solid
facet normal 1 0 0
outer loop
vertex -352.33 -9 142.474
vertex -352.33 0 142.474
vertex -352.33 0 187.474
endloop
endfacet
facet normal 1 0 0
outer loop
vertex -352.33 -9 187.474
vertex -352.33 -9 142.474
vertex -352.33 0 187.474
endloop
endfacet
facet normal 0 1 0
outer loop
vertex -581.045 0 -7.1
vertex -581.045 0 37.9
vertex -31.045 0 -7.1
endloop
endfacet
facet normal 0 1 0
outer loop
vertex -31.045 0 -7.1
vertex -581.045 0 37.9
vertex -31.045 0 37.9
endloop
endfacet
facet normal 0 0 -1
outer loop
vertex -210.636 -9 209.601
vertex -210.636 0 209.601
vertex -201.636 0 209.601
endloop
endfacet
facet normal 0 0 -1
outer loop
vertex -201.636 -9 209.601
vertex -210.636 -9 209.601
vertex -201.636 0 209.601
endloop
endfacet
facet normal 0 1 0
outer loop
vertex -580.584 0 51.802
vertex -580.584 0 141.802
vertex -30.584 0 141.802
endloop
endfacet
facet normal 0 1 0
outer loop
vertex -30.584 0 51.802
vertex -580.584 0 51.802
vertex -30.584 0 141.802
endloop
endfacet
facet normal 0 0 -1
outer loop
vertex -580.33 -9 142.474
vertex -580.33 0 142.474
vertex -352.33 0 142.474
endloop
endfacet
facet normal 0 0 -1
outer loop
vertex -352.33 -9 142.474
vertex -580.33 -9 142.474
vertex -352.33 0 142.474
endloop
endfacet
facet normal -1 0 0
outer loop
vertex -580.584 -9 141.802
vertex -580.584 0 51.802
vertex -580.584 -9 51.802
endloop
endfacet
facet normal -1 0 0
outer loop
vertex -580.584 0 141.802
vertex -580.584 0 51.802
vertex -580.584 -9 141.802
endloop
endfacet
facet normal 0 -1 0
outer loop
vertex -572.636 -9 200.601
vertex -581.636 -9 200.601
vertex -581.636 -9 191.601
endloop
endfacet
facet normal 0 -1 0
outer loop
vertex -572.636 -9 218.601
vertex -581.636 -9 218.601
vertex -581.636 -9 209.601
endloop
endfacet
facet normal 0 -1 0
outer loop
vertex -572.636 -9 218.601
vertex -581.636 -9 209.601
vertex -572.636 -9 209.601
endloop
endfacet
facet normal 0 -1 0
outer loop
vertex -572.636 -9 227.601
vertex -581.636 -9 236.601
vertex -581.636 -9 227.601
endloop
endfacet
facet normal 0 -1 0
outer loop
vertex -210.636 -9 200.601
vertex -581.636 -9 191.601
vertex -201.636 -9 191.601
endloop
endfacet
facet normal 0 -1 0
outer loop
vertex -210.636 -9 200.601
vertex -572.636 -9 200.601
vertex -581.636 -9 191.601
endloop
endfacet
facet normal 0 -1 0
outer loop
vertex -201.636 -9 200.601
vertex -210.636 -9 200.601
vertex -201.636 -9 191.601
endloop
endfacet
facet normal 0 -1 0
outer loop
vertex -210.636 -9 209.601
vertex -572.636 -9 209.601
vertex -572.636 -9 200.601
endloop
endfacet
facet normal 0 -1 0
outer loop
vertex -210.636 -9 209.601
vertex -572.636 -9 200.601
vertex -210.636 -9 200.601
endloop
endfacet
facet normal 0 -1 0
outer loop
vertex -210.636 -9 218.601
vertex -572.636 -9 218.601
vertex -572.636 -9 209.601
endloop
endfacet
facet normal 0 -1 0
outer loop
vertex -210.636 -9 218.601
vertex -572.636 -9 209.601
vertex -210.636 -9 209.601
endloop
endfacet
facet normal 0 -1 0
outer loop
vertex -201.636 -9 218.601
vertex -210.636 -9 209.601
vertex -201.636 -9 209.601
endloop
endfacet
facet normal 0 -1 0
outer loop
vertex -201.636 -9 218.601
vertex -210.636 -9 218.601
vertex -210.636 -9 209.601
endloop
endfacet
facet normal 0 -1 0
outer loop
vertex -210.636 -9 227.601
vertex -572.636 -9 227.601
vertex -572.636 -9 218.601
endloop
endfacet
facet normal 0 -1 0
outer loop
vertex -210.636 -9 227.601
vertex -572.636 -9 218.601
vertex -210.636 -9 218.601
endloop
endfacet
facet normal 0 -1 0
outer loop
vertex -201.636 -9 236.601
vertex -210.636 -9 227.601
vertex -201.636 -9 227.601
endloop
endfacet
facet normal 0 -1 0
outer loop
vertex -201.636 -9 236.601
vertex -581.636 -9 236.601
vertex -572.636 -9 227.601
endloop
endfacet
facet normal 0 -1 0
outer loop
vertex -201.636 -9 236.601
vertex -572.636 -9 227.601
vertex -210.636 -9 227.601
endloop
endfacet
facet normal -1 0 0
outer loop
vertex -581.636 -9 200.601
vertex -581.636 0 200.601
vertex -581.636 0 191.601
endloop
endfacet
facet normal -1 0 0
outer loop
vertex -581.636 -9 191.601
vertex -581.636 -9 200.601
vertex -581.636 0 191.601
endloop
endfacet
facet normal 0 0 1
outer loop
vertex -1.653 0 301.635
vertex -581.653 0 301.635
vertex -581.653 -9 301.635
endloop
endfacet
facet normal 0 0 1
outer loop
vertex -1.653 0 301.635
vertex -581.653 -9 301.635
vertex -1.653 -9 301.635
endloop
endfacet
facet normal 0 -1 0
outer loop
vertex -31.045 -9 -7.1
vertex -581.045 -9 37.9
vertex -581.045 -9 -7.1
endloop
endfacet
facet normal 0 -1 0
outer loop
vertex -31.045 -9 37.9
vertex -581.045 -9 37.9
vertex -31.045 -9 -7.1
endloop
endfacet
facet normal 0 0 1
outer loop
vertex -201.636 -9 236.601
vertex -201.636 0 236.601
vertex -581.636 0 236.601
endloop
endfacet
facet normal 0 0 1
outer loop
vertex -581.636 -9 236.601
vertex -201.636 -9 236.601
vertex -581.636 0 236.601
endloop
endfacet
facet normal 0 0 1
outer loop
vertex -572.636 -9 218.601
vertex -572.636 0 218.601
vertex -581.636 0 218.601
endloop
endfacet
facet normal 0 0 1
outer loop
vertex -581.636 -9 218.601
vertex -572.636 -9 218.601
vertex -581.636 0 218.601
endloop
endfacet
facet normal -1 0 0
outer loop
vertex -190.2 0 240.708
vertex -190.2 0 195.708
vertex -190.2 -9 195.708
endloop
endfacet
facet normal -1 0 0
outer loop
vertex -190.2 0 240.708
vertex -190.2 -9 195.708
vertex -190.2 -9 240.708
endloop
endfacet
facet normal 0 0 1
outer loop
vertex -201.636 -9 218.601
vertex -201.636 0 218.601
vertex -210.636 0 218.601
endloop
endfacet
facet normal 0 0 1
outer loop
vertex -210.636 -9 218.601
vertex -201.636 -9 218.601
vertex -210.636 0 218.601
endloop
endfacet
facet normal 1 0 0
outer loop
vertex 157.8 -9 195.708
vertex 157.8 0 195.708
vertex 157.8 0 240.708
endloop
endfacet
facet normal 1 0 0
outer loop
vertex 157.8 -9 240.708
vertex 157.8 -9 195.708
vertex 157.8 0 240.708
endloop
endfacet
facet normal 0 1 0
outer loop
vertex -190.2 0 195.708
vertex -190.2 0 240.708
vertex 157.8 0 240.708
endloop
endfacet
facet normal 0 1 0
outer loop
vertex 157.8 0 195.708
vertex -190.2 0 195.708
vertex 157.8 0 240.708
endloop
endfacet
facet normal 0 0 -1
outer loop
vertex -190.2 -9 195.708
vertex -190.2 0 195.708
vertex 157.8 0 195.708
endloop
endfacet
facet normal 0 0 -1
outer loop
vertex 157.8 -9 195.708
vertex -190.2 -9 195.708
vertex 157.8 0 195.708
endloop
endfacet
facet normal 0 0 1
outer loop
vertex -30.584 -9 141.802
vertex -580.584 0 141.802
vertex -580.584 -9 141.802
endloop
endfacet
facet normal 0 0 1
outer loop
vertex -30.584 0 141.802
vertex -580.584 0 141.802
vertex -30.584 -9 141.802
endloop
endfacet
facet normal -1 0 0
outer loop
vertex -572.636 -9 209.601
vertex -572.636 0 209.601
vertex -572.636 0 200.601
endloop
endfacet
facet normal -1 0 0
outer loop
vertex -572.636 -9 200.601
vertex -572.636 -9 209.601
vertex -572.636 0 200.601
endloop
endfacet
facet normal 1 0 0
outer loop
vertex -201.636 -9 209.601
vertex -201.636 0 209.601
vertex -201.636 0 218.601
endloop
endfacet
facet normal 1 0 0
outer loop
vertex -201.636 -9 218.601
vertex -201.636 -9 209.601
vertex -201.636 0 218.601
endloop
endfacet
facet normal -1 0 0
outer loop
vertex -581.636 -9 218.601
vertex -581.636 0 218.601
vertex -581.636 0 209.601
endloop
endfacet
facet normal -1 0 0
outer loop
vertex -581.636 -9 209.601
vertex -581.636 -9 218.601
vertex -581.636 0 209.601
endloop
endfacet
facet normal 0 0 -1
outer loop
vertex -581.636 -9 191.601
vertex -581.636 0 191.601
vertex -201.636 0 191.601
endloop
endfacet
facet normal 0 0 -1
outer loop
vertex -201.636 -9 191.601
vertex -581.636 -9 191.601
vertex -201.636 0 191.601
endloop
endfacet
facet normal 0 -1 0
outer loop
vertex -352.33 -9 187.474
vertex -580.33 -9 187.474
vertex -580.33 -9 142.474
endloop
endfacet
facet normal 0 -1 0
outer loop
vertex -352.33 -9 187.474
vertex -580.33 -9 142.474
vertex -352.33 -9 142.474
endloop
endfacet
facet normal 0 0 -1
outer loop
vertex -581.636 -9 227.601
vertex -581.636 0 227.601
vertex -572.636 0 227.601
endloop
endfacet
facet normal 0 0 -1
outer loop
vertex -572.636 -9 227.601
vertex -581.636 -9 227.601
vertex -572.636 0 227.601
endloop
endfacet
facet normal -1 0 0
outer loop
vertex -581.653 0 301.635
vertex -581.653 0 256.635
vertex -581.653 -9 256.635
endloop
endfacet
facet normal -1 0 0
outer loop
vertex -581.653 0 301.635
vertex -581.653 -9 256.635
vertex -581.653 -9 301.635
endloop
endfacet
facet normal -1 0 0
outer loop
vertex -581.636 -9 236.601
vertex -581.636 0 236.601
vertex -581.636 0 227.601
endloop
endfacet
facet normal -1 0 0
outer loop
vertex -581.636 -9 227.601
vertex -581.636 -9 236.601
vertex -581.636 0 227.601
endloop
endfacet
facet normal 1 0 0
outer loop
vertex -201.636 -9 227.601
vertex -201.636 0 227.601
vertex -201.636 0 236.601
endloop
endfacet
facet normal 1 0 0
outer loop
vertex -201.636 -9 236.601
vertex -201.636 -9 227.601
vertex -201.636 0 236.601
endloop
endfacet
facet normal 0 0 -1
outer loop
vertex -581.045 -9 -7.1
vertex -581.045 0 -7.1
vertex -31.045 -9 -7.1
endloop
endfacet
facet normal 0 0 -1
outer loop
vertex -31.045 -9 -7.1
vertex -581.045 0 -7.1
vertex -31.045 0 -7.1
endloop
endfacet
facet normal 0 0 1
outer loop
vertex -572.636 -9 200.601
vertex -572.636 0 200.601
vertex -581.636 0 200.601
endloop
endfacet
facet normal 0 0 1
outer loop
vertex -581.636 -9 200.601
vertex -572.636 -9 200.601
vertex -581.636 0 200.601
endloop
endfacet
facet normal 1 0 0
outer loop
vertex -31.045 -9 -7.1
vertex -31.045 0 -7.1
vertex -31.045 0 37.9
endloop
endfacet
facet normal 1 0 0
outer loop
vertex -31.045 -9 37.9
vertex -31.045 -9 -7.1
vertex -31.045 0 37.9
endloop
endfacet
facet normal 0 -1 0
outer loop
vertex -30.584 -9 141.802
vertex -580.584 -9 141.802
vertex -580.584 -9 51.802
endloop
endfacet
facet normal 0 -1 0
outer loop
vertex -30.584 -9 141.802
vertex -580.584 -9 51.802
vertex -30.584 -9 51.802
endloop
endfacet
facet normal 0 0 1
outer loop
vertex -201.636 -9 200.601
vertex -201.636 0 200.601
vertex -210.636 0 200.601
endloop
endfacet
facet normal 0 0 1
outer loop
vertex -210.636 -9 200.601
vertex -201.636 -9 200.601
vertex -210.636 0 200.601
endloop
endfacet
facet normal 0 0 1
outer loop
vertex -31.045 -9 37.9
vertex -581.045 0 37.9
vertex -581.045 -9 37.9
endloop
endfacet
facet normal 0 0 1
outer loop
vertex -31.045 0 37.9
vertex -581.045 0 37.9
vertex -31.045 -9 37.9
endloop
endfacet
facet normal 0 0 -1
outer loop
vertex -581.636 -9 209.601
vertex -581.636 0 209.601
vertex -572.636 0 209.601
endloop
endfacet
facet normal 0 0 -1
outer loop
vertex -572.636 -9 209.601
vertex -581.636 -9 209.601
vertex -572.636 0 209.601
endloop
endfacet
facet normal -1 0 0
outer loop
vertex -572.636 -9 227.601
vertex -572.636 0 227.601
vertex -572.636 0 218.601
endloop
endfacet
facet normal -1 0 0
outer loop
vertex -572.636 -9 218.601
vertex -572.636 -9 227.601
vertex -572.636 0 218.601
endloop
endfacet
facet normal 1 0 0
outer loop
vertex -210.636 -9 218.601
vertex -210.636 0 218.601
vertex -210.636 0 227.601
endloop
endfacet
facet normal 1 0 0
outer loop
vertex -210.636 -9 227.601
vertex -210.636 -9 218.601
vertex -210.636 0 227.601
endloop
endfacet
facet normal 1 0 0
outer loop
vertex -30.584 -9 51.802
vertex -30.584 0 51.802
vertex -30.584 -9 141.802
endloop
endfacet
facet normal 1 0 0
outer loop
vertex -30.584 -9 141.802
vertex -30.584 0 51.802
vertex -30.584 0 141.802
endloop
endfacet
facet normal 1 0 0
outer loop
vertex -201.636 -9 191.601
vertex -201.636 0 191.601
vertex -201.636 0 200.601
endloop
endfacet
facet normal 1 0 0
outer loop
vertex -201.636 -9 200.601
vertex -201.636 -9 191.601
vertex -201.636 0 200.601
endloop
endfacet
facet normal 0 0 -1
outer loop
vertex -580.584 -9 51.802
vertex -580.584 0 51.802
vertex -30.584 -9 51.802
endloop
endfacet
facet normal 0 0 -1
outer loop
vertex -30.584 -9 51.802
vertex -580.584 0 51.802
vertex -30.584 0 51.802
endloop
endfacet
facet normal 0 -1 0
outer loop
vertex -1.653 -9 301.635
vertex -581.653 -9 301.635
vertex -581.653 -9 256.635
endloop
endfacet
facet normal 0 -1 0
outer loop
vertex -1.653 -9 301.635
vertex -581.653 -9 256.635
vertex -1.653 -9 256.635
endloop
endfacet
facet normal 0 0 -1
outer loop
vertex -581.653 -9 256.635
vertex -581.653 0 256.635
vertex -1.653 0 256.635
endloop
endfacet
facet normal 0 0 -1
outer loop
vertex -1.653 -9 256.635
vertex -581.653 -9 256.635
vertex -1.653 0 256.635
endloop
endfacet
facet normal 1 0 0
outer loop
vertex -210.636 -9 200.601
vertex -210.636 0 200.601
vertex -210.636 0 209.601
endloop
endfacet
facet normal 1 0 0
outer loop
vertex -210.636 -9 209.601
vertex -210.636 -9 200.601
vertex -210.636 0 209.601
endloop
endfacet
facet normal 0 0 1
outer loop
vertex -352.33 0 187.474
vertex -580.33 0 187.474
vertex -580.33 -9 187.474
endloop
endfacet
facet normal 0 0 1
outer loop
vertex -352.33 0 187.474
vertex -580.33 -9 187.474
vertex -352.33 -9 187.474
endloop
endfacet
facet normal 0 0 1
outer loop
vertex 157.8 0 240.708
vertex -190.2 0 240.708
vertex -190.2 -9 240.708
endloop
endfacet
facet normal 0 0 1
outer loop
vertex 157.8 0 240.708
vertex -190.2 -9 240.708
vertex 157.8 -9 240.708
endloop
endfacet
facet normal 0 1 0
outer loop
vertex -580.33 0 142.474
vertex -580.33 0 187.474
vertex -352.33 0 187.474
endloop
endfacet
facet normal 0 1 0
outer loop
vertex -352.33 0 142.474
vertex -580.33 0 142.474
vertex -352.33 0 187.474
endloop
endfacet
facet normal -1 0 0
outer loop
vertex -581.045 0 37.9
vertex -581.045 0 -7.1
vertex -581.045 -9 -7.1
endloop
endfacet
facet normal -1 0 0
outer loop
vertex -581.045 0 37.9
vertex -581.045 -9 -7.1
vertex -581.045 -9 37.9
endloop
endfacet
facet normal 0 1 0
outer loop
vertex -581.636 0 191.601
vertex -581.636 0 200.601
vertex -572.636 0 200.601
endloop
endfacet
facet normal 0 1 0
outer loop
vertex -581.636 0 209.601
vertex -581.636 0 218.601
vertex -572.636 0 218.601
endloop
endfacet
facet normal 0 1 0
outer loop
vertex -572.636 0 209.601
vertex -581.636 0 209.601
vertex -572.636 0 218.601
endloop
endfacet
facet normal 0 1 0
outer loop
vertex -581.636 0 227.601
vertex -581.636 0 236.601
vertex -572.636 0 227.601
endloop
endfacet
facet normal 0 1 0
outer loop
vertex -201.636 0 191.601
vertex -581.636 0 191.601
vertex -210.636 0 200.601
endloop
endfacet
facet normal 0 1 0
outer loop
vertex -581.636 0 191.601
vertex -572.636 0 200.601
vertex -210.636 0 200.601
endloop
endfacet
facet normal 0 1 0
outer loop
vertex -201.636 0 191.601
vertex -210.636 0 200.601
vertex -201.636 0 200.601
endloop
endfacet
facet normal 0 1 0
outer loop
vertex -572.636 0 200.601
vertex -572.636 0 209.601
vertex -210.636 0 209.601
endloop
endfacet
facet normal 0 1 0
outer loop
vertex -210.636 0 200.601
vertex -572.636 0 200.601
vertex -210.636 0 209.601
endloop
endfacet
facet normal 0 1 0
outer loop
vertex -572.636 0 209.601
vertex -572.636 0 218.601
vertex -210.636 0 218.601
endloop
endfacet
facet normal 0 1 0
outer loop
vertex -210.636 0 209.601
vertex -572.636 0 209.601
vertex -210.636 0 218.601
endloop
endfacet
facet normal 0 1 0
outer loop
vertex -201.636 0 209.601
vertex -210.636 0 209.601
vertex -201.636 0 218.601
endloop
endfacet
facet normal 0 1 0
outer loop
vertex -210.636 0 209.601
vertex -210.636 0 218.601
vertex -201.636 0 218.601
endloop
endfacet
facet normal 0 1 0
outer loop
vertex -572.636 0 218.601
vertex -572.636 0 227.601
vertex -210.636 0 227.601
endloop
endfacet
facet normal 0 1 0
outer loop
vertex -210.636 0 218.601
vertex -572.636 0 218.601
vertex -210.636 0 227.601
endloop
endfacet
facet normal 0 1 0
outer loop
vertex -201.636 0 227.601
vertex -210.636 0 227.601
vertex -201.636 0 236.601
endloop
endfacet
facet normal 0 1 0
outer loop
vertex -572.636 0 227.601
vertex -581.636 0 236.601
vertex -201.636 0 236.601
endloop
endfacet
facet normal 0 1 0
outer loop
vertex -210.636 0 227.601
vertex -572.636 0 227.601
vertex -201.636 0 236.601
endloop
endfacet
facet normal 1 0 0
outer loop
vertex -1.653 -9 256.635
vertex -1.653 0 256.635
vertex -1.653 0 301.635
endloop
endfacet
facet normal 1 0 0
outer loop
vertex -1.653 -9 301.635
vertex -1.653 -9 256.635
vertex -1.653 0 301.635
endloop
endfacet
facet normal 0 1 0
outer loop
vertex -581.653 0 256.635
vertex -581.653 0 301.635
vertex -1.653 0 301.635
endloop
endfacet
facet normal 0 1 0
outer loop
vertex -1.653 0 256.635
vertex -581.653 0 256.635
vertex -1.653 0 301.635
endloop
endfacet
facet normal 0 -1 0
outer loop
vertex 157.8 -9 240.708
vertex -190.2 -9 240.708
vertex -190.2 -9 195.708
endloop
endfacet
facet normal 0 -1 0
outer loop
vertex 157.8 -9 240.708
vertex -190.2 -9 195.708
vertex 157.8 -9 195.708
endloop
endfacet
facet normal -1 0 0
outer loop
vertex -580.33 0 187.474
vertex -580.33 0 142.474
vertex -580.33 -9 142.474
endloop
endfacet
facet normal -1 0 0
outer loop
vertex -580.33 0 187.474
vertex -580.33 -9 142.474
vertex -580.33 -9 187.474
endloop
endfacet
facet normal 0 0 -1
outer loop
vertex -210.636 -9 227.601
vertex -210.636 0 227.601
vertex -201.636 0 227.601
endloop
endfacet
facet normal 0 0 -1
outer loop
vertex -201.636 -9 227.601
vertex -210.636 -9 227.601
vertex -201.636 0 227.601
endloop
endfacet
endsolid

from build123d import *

# Parameters (mm, degrees)
F0_W      = 580
F0_H      = 45
F1_DEPTH  = 9
F2_W      = 9
F2_H      = 9
F3_DEPTH  = 9
F4_W      = 348
F4_H      = 45
F5_DEPTH  = 9
F6_W      = 228
F6_H      = 45
F7_DEPTH  = 9
F8_W      = 550
F8_H      = 90
F9_DEPTH  = 9
F10_W     = 550
F10_H     = 45
F11_DEPTH = 9


with BuildPart() as f1:
    # F0 (on Front) → F1 (new body)
    with BuildSketch(Plane.XZ):
        with Locations((-291.652689, 279.135075)):
            Rectangle(F0_W, F0_H)
    extrude(amount=F1_DEPTH)


with BuildPart() as f3:
    # F2 (on Front) → F3 (new body)
    with BuildSketch(Plane.XZ):
        Polygon((-572.635822, 236.600574), (-581.635822, 236.600574), (-581.635822, 227.600574), (-572.635822, 227.600574), (-572.635822, 218.600574), (-581.635822, 218.600574), (-581.635822, 209.600574), (-572.635822, 209.600574), (-572.635822, 200.600574), (-581.635822, 200.600574), (-581.635822, 191.600574), (-572.635822, 191.600574), (-210.635822, 191.600574), (-201.635822, 191.600574), (-201.635822, 196.600574), (-201.635822, 200.600574), (-210.635822, 200.600574), (-210.635822, 209.600574), (-201.635822, 209.600574), (-201.635822, 218.600574), (-210.635822, 218.600574), (-210.635822, 227.600574), (-210.635822, 236.600574), align=None)
        with Locations((-206.135822, 232.100574)):
            Rectangle(F2_W, F2_H)
    extrude(amount=F3_DEPTH)


with BuildPart() as f5:
    # F4 (on Front) → F5 (new body)
    with BuildSketch(Plane.XZ):
        with Locations((-16.199863, 218.208126)):
            Rectangle(F4_W, F4_H)
    extrude(amount=F5_DEPTH)


with BuildPart() as f7:
    # F6 (on Front) → F7 (new body)
    with BuildSketch(Plane.XZ):
        with Locations((-466.329738, 164.974428)):
            Rectangle(F6_W, F6_H)
    extrude(amount=F7_DEPTH)


with BuildPart() as f9:
    # F8 (on Front) → F9 (new body)
    with BuildSketch(Plane.XZ):
        with Locations((-305.584455, 96.802367)):
            Rectangle(F8_W, F8_H)
    extrude(amount=F9_DEPTH)


with BuildPart() as f11:
    # F10 (on Front) → F11 (new body)
    with BuildSketch(Plane.XZ):
        with Locations((-306.044923, 15.400222)):
            Rectangle(F10_W, F10_H)
    extrude(amount=F11_DEPTH)


solid = Compound([f1.part, f3.part, f5.part, f7.part, f9.part, f11.part])
